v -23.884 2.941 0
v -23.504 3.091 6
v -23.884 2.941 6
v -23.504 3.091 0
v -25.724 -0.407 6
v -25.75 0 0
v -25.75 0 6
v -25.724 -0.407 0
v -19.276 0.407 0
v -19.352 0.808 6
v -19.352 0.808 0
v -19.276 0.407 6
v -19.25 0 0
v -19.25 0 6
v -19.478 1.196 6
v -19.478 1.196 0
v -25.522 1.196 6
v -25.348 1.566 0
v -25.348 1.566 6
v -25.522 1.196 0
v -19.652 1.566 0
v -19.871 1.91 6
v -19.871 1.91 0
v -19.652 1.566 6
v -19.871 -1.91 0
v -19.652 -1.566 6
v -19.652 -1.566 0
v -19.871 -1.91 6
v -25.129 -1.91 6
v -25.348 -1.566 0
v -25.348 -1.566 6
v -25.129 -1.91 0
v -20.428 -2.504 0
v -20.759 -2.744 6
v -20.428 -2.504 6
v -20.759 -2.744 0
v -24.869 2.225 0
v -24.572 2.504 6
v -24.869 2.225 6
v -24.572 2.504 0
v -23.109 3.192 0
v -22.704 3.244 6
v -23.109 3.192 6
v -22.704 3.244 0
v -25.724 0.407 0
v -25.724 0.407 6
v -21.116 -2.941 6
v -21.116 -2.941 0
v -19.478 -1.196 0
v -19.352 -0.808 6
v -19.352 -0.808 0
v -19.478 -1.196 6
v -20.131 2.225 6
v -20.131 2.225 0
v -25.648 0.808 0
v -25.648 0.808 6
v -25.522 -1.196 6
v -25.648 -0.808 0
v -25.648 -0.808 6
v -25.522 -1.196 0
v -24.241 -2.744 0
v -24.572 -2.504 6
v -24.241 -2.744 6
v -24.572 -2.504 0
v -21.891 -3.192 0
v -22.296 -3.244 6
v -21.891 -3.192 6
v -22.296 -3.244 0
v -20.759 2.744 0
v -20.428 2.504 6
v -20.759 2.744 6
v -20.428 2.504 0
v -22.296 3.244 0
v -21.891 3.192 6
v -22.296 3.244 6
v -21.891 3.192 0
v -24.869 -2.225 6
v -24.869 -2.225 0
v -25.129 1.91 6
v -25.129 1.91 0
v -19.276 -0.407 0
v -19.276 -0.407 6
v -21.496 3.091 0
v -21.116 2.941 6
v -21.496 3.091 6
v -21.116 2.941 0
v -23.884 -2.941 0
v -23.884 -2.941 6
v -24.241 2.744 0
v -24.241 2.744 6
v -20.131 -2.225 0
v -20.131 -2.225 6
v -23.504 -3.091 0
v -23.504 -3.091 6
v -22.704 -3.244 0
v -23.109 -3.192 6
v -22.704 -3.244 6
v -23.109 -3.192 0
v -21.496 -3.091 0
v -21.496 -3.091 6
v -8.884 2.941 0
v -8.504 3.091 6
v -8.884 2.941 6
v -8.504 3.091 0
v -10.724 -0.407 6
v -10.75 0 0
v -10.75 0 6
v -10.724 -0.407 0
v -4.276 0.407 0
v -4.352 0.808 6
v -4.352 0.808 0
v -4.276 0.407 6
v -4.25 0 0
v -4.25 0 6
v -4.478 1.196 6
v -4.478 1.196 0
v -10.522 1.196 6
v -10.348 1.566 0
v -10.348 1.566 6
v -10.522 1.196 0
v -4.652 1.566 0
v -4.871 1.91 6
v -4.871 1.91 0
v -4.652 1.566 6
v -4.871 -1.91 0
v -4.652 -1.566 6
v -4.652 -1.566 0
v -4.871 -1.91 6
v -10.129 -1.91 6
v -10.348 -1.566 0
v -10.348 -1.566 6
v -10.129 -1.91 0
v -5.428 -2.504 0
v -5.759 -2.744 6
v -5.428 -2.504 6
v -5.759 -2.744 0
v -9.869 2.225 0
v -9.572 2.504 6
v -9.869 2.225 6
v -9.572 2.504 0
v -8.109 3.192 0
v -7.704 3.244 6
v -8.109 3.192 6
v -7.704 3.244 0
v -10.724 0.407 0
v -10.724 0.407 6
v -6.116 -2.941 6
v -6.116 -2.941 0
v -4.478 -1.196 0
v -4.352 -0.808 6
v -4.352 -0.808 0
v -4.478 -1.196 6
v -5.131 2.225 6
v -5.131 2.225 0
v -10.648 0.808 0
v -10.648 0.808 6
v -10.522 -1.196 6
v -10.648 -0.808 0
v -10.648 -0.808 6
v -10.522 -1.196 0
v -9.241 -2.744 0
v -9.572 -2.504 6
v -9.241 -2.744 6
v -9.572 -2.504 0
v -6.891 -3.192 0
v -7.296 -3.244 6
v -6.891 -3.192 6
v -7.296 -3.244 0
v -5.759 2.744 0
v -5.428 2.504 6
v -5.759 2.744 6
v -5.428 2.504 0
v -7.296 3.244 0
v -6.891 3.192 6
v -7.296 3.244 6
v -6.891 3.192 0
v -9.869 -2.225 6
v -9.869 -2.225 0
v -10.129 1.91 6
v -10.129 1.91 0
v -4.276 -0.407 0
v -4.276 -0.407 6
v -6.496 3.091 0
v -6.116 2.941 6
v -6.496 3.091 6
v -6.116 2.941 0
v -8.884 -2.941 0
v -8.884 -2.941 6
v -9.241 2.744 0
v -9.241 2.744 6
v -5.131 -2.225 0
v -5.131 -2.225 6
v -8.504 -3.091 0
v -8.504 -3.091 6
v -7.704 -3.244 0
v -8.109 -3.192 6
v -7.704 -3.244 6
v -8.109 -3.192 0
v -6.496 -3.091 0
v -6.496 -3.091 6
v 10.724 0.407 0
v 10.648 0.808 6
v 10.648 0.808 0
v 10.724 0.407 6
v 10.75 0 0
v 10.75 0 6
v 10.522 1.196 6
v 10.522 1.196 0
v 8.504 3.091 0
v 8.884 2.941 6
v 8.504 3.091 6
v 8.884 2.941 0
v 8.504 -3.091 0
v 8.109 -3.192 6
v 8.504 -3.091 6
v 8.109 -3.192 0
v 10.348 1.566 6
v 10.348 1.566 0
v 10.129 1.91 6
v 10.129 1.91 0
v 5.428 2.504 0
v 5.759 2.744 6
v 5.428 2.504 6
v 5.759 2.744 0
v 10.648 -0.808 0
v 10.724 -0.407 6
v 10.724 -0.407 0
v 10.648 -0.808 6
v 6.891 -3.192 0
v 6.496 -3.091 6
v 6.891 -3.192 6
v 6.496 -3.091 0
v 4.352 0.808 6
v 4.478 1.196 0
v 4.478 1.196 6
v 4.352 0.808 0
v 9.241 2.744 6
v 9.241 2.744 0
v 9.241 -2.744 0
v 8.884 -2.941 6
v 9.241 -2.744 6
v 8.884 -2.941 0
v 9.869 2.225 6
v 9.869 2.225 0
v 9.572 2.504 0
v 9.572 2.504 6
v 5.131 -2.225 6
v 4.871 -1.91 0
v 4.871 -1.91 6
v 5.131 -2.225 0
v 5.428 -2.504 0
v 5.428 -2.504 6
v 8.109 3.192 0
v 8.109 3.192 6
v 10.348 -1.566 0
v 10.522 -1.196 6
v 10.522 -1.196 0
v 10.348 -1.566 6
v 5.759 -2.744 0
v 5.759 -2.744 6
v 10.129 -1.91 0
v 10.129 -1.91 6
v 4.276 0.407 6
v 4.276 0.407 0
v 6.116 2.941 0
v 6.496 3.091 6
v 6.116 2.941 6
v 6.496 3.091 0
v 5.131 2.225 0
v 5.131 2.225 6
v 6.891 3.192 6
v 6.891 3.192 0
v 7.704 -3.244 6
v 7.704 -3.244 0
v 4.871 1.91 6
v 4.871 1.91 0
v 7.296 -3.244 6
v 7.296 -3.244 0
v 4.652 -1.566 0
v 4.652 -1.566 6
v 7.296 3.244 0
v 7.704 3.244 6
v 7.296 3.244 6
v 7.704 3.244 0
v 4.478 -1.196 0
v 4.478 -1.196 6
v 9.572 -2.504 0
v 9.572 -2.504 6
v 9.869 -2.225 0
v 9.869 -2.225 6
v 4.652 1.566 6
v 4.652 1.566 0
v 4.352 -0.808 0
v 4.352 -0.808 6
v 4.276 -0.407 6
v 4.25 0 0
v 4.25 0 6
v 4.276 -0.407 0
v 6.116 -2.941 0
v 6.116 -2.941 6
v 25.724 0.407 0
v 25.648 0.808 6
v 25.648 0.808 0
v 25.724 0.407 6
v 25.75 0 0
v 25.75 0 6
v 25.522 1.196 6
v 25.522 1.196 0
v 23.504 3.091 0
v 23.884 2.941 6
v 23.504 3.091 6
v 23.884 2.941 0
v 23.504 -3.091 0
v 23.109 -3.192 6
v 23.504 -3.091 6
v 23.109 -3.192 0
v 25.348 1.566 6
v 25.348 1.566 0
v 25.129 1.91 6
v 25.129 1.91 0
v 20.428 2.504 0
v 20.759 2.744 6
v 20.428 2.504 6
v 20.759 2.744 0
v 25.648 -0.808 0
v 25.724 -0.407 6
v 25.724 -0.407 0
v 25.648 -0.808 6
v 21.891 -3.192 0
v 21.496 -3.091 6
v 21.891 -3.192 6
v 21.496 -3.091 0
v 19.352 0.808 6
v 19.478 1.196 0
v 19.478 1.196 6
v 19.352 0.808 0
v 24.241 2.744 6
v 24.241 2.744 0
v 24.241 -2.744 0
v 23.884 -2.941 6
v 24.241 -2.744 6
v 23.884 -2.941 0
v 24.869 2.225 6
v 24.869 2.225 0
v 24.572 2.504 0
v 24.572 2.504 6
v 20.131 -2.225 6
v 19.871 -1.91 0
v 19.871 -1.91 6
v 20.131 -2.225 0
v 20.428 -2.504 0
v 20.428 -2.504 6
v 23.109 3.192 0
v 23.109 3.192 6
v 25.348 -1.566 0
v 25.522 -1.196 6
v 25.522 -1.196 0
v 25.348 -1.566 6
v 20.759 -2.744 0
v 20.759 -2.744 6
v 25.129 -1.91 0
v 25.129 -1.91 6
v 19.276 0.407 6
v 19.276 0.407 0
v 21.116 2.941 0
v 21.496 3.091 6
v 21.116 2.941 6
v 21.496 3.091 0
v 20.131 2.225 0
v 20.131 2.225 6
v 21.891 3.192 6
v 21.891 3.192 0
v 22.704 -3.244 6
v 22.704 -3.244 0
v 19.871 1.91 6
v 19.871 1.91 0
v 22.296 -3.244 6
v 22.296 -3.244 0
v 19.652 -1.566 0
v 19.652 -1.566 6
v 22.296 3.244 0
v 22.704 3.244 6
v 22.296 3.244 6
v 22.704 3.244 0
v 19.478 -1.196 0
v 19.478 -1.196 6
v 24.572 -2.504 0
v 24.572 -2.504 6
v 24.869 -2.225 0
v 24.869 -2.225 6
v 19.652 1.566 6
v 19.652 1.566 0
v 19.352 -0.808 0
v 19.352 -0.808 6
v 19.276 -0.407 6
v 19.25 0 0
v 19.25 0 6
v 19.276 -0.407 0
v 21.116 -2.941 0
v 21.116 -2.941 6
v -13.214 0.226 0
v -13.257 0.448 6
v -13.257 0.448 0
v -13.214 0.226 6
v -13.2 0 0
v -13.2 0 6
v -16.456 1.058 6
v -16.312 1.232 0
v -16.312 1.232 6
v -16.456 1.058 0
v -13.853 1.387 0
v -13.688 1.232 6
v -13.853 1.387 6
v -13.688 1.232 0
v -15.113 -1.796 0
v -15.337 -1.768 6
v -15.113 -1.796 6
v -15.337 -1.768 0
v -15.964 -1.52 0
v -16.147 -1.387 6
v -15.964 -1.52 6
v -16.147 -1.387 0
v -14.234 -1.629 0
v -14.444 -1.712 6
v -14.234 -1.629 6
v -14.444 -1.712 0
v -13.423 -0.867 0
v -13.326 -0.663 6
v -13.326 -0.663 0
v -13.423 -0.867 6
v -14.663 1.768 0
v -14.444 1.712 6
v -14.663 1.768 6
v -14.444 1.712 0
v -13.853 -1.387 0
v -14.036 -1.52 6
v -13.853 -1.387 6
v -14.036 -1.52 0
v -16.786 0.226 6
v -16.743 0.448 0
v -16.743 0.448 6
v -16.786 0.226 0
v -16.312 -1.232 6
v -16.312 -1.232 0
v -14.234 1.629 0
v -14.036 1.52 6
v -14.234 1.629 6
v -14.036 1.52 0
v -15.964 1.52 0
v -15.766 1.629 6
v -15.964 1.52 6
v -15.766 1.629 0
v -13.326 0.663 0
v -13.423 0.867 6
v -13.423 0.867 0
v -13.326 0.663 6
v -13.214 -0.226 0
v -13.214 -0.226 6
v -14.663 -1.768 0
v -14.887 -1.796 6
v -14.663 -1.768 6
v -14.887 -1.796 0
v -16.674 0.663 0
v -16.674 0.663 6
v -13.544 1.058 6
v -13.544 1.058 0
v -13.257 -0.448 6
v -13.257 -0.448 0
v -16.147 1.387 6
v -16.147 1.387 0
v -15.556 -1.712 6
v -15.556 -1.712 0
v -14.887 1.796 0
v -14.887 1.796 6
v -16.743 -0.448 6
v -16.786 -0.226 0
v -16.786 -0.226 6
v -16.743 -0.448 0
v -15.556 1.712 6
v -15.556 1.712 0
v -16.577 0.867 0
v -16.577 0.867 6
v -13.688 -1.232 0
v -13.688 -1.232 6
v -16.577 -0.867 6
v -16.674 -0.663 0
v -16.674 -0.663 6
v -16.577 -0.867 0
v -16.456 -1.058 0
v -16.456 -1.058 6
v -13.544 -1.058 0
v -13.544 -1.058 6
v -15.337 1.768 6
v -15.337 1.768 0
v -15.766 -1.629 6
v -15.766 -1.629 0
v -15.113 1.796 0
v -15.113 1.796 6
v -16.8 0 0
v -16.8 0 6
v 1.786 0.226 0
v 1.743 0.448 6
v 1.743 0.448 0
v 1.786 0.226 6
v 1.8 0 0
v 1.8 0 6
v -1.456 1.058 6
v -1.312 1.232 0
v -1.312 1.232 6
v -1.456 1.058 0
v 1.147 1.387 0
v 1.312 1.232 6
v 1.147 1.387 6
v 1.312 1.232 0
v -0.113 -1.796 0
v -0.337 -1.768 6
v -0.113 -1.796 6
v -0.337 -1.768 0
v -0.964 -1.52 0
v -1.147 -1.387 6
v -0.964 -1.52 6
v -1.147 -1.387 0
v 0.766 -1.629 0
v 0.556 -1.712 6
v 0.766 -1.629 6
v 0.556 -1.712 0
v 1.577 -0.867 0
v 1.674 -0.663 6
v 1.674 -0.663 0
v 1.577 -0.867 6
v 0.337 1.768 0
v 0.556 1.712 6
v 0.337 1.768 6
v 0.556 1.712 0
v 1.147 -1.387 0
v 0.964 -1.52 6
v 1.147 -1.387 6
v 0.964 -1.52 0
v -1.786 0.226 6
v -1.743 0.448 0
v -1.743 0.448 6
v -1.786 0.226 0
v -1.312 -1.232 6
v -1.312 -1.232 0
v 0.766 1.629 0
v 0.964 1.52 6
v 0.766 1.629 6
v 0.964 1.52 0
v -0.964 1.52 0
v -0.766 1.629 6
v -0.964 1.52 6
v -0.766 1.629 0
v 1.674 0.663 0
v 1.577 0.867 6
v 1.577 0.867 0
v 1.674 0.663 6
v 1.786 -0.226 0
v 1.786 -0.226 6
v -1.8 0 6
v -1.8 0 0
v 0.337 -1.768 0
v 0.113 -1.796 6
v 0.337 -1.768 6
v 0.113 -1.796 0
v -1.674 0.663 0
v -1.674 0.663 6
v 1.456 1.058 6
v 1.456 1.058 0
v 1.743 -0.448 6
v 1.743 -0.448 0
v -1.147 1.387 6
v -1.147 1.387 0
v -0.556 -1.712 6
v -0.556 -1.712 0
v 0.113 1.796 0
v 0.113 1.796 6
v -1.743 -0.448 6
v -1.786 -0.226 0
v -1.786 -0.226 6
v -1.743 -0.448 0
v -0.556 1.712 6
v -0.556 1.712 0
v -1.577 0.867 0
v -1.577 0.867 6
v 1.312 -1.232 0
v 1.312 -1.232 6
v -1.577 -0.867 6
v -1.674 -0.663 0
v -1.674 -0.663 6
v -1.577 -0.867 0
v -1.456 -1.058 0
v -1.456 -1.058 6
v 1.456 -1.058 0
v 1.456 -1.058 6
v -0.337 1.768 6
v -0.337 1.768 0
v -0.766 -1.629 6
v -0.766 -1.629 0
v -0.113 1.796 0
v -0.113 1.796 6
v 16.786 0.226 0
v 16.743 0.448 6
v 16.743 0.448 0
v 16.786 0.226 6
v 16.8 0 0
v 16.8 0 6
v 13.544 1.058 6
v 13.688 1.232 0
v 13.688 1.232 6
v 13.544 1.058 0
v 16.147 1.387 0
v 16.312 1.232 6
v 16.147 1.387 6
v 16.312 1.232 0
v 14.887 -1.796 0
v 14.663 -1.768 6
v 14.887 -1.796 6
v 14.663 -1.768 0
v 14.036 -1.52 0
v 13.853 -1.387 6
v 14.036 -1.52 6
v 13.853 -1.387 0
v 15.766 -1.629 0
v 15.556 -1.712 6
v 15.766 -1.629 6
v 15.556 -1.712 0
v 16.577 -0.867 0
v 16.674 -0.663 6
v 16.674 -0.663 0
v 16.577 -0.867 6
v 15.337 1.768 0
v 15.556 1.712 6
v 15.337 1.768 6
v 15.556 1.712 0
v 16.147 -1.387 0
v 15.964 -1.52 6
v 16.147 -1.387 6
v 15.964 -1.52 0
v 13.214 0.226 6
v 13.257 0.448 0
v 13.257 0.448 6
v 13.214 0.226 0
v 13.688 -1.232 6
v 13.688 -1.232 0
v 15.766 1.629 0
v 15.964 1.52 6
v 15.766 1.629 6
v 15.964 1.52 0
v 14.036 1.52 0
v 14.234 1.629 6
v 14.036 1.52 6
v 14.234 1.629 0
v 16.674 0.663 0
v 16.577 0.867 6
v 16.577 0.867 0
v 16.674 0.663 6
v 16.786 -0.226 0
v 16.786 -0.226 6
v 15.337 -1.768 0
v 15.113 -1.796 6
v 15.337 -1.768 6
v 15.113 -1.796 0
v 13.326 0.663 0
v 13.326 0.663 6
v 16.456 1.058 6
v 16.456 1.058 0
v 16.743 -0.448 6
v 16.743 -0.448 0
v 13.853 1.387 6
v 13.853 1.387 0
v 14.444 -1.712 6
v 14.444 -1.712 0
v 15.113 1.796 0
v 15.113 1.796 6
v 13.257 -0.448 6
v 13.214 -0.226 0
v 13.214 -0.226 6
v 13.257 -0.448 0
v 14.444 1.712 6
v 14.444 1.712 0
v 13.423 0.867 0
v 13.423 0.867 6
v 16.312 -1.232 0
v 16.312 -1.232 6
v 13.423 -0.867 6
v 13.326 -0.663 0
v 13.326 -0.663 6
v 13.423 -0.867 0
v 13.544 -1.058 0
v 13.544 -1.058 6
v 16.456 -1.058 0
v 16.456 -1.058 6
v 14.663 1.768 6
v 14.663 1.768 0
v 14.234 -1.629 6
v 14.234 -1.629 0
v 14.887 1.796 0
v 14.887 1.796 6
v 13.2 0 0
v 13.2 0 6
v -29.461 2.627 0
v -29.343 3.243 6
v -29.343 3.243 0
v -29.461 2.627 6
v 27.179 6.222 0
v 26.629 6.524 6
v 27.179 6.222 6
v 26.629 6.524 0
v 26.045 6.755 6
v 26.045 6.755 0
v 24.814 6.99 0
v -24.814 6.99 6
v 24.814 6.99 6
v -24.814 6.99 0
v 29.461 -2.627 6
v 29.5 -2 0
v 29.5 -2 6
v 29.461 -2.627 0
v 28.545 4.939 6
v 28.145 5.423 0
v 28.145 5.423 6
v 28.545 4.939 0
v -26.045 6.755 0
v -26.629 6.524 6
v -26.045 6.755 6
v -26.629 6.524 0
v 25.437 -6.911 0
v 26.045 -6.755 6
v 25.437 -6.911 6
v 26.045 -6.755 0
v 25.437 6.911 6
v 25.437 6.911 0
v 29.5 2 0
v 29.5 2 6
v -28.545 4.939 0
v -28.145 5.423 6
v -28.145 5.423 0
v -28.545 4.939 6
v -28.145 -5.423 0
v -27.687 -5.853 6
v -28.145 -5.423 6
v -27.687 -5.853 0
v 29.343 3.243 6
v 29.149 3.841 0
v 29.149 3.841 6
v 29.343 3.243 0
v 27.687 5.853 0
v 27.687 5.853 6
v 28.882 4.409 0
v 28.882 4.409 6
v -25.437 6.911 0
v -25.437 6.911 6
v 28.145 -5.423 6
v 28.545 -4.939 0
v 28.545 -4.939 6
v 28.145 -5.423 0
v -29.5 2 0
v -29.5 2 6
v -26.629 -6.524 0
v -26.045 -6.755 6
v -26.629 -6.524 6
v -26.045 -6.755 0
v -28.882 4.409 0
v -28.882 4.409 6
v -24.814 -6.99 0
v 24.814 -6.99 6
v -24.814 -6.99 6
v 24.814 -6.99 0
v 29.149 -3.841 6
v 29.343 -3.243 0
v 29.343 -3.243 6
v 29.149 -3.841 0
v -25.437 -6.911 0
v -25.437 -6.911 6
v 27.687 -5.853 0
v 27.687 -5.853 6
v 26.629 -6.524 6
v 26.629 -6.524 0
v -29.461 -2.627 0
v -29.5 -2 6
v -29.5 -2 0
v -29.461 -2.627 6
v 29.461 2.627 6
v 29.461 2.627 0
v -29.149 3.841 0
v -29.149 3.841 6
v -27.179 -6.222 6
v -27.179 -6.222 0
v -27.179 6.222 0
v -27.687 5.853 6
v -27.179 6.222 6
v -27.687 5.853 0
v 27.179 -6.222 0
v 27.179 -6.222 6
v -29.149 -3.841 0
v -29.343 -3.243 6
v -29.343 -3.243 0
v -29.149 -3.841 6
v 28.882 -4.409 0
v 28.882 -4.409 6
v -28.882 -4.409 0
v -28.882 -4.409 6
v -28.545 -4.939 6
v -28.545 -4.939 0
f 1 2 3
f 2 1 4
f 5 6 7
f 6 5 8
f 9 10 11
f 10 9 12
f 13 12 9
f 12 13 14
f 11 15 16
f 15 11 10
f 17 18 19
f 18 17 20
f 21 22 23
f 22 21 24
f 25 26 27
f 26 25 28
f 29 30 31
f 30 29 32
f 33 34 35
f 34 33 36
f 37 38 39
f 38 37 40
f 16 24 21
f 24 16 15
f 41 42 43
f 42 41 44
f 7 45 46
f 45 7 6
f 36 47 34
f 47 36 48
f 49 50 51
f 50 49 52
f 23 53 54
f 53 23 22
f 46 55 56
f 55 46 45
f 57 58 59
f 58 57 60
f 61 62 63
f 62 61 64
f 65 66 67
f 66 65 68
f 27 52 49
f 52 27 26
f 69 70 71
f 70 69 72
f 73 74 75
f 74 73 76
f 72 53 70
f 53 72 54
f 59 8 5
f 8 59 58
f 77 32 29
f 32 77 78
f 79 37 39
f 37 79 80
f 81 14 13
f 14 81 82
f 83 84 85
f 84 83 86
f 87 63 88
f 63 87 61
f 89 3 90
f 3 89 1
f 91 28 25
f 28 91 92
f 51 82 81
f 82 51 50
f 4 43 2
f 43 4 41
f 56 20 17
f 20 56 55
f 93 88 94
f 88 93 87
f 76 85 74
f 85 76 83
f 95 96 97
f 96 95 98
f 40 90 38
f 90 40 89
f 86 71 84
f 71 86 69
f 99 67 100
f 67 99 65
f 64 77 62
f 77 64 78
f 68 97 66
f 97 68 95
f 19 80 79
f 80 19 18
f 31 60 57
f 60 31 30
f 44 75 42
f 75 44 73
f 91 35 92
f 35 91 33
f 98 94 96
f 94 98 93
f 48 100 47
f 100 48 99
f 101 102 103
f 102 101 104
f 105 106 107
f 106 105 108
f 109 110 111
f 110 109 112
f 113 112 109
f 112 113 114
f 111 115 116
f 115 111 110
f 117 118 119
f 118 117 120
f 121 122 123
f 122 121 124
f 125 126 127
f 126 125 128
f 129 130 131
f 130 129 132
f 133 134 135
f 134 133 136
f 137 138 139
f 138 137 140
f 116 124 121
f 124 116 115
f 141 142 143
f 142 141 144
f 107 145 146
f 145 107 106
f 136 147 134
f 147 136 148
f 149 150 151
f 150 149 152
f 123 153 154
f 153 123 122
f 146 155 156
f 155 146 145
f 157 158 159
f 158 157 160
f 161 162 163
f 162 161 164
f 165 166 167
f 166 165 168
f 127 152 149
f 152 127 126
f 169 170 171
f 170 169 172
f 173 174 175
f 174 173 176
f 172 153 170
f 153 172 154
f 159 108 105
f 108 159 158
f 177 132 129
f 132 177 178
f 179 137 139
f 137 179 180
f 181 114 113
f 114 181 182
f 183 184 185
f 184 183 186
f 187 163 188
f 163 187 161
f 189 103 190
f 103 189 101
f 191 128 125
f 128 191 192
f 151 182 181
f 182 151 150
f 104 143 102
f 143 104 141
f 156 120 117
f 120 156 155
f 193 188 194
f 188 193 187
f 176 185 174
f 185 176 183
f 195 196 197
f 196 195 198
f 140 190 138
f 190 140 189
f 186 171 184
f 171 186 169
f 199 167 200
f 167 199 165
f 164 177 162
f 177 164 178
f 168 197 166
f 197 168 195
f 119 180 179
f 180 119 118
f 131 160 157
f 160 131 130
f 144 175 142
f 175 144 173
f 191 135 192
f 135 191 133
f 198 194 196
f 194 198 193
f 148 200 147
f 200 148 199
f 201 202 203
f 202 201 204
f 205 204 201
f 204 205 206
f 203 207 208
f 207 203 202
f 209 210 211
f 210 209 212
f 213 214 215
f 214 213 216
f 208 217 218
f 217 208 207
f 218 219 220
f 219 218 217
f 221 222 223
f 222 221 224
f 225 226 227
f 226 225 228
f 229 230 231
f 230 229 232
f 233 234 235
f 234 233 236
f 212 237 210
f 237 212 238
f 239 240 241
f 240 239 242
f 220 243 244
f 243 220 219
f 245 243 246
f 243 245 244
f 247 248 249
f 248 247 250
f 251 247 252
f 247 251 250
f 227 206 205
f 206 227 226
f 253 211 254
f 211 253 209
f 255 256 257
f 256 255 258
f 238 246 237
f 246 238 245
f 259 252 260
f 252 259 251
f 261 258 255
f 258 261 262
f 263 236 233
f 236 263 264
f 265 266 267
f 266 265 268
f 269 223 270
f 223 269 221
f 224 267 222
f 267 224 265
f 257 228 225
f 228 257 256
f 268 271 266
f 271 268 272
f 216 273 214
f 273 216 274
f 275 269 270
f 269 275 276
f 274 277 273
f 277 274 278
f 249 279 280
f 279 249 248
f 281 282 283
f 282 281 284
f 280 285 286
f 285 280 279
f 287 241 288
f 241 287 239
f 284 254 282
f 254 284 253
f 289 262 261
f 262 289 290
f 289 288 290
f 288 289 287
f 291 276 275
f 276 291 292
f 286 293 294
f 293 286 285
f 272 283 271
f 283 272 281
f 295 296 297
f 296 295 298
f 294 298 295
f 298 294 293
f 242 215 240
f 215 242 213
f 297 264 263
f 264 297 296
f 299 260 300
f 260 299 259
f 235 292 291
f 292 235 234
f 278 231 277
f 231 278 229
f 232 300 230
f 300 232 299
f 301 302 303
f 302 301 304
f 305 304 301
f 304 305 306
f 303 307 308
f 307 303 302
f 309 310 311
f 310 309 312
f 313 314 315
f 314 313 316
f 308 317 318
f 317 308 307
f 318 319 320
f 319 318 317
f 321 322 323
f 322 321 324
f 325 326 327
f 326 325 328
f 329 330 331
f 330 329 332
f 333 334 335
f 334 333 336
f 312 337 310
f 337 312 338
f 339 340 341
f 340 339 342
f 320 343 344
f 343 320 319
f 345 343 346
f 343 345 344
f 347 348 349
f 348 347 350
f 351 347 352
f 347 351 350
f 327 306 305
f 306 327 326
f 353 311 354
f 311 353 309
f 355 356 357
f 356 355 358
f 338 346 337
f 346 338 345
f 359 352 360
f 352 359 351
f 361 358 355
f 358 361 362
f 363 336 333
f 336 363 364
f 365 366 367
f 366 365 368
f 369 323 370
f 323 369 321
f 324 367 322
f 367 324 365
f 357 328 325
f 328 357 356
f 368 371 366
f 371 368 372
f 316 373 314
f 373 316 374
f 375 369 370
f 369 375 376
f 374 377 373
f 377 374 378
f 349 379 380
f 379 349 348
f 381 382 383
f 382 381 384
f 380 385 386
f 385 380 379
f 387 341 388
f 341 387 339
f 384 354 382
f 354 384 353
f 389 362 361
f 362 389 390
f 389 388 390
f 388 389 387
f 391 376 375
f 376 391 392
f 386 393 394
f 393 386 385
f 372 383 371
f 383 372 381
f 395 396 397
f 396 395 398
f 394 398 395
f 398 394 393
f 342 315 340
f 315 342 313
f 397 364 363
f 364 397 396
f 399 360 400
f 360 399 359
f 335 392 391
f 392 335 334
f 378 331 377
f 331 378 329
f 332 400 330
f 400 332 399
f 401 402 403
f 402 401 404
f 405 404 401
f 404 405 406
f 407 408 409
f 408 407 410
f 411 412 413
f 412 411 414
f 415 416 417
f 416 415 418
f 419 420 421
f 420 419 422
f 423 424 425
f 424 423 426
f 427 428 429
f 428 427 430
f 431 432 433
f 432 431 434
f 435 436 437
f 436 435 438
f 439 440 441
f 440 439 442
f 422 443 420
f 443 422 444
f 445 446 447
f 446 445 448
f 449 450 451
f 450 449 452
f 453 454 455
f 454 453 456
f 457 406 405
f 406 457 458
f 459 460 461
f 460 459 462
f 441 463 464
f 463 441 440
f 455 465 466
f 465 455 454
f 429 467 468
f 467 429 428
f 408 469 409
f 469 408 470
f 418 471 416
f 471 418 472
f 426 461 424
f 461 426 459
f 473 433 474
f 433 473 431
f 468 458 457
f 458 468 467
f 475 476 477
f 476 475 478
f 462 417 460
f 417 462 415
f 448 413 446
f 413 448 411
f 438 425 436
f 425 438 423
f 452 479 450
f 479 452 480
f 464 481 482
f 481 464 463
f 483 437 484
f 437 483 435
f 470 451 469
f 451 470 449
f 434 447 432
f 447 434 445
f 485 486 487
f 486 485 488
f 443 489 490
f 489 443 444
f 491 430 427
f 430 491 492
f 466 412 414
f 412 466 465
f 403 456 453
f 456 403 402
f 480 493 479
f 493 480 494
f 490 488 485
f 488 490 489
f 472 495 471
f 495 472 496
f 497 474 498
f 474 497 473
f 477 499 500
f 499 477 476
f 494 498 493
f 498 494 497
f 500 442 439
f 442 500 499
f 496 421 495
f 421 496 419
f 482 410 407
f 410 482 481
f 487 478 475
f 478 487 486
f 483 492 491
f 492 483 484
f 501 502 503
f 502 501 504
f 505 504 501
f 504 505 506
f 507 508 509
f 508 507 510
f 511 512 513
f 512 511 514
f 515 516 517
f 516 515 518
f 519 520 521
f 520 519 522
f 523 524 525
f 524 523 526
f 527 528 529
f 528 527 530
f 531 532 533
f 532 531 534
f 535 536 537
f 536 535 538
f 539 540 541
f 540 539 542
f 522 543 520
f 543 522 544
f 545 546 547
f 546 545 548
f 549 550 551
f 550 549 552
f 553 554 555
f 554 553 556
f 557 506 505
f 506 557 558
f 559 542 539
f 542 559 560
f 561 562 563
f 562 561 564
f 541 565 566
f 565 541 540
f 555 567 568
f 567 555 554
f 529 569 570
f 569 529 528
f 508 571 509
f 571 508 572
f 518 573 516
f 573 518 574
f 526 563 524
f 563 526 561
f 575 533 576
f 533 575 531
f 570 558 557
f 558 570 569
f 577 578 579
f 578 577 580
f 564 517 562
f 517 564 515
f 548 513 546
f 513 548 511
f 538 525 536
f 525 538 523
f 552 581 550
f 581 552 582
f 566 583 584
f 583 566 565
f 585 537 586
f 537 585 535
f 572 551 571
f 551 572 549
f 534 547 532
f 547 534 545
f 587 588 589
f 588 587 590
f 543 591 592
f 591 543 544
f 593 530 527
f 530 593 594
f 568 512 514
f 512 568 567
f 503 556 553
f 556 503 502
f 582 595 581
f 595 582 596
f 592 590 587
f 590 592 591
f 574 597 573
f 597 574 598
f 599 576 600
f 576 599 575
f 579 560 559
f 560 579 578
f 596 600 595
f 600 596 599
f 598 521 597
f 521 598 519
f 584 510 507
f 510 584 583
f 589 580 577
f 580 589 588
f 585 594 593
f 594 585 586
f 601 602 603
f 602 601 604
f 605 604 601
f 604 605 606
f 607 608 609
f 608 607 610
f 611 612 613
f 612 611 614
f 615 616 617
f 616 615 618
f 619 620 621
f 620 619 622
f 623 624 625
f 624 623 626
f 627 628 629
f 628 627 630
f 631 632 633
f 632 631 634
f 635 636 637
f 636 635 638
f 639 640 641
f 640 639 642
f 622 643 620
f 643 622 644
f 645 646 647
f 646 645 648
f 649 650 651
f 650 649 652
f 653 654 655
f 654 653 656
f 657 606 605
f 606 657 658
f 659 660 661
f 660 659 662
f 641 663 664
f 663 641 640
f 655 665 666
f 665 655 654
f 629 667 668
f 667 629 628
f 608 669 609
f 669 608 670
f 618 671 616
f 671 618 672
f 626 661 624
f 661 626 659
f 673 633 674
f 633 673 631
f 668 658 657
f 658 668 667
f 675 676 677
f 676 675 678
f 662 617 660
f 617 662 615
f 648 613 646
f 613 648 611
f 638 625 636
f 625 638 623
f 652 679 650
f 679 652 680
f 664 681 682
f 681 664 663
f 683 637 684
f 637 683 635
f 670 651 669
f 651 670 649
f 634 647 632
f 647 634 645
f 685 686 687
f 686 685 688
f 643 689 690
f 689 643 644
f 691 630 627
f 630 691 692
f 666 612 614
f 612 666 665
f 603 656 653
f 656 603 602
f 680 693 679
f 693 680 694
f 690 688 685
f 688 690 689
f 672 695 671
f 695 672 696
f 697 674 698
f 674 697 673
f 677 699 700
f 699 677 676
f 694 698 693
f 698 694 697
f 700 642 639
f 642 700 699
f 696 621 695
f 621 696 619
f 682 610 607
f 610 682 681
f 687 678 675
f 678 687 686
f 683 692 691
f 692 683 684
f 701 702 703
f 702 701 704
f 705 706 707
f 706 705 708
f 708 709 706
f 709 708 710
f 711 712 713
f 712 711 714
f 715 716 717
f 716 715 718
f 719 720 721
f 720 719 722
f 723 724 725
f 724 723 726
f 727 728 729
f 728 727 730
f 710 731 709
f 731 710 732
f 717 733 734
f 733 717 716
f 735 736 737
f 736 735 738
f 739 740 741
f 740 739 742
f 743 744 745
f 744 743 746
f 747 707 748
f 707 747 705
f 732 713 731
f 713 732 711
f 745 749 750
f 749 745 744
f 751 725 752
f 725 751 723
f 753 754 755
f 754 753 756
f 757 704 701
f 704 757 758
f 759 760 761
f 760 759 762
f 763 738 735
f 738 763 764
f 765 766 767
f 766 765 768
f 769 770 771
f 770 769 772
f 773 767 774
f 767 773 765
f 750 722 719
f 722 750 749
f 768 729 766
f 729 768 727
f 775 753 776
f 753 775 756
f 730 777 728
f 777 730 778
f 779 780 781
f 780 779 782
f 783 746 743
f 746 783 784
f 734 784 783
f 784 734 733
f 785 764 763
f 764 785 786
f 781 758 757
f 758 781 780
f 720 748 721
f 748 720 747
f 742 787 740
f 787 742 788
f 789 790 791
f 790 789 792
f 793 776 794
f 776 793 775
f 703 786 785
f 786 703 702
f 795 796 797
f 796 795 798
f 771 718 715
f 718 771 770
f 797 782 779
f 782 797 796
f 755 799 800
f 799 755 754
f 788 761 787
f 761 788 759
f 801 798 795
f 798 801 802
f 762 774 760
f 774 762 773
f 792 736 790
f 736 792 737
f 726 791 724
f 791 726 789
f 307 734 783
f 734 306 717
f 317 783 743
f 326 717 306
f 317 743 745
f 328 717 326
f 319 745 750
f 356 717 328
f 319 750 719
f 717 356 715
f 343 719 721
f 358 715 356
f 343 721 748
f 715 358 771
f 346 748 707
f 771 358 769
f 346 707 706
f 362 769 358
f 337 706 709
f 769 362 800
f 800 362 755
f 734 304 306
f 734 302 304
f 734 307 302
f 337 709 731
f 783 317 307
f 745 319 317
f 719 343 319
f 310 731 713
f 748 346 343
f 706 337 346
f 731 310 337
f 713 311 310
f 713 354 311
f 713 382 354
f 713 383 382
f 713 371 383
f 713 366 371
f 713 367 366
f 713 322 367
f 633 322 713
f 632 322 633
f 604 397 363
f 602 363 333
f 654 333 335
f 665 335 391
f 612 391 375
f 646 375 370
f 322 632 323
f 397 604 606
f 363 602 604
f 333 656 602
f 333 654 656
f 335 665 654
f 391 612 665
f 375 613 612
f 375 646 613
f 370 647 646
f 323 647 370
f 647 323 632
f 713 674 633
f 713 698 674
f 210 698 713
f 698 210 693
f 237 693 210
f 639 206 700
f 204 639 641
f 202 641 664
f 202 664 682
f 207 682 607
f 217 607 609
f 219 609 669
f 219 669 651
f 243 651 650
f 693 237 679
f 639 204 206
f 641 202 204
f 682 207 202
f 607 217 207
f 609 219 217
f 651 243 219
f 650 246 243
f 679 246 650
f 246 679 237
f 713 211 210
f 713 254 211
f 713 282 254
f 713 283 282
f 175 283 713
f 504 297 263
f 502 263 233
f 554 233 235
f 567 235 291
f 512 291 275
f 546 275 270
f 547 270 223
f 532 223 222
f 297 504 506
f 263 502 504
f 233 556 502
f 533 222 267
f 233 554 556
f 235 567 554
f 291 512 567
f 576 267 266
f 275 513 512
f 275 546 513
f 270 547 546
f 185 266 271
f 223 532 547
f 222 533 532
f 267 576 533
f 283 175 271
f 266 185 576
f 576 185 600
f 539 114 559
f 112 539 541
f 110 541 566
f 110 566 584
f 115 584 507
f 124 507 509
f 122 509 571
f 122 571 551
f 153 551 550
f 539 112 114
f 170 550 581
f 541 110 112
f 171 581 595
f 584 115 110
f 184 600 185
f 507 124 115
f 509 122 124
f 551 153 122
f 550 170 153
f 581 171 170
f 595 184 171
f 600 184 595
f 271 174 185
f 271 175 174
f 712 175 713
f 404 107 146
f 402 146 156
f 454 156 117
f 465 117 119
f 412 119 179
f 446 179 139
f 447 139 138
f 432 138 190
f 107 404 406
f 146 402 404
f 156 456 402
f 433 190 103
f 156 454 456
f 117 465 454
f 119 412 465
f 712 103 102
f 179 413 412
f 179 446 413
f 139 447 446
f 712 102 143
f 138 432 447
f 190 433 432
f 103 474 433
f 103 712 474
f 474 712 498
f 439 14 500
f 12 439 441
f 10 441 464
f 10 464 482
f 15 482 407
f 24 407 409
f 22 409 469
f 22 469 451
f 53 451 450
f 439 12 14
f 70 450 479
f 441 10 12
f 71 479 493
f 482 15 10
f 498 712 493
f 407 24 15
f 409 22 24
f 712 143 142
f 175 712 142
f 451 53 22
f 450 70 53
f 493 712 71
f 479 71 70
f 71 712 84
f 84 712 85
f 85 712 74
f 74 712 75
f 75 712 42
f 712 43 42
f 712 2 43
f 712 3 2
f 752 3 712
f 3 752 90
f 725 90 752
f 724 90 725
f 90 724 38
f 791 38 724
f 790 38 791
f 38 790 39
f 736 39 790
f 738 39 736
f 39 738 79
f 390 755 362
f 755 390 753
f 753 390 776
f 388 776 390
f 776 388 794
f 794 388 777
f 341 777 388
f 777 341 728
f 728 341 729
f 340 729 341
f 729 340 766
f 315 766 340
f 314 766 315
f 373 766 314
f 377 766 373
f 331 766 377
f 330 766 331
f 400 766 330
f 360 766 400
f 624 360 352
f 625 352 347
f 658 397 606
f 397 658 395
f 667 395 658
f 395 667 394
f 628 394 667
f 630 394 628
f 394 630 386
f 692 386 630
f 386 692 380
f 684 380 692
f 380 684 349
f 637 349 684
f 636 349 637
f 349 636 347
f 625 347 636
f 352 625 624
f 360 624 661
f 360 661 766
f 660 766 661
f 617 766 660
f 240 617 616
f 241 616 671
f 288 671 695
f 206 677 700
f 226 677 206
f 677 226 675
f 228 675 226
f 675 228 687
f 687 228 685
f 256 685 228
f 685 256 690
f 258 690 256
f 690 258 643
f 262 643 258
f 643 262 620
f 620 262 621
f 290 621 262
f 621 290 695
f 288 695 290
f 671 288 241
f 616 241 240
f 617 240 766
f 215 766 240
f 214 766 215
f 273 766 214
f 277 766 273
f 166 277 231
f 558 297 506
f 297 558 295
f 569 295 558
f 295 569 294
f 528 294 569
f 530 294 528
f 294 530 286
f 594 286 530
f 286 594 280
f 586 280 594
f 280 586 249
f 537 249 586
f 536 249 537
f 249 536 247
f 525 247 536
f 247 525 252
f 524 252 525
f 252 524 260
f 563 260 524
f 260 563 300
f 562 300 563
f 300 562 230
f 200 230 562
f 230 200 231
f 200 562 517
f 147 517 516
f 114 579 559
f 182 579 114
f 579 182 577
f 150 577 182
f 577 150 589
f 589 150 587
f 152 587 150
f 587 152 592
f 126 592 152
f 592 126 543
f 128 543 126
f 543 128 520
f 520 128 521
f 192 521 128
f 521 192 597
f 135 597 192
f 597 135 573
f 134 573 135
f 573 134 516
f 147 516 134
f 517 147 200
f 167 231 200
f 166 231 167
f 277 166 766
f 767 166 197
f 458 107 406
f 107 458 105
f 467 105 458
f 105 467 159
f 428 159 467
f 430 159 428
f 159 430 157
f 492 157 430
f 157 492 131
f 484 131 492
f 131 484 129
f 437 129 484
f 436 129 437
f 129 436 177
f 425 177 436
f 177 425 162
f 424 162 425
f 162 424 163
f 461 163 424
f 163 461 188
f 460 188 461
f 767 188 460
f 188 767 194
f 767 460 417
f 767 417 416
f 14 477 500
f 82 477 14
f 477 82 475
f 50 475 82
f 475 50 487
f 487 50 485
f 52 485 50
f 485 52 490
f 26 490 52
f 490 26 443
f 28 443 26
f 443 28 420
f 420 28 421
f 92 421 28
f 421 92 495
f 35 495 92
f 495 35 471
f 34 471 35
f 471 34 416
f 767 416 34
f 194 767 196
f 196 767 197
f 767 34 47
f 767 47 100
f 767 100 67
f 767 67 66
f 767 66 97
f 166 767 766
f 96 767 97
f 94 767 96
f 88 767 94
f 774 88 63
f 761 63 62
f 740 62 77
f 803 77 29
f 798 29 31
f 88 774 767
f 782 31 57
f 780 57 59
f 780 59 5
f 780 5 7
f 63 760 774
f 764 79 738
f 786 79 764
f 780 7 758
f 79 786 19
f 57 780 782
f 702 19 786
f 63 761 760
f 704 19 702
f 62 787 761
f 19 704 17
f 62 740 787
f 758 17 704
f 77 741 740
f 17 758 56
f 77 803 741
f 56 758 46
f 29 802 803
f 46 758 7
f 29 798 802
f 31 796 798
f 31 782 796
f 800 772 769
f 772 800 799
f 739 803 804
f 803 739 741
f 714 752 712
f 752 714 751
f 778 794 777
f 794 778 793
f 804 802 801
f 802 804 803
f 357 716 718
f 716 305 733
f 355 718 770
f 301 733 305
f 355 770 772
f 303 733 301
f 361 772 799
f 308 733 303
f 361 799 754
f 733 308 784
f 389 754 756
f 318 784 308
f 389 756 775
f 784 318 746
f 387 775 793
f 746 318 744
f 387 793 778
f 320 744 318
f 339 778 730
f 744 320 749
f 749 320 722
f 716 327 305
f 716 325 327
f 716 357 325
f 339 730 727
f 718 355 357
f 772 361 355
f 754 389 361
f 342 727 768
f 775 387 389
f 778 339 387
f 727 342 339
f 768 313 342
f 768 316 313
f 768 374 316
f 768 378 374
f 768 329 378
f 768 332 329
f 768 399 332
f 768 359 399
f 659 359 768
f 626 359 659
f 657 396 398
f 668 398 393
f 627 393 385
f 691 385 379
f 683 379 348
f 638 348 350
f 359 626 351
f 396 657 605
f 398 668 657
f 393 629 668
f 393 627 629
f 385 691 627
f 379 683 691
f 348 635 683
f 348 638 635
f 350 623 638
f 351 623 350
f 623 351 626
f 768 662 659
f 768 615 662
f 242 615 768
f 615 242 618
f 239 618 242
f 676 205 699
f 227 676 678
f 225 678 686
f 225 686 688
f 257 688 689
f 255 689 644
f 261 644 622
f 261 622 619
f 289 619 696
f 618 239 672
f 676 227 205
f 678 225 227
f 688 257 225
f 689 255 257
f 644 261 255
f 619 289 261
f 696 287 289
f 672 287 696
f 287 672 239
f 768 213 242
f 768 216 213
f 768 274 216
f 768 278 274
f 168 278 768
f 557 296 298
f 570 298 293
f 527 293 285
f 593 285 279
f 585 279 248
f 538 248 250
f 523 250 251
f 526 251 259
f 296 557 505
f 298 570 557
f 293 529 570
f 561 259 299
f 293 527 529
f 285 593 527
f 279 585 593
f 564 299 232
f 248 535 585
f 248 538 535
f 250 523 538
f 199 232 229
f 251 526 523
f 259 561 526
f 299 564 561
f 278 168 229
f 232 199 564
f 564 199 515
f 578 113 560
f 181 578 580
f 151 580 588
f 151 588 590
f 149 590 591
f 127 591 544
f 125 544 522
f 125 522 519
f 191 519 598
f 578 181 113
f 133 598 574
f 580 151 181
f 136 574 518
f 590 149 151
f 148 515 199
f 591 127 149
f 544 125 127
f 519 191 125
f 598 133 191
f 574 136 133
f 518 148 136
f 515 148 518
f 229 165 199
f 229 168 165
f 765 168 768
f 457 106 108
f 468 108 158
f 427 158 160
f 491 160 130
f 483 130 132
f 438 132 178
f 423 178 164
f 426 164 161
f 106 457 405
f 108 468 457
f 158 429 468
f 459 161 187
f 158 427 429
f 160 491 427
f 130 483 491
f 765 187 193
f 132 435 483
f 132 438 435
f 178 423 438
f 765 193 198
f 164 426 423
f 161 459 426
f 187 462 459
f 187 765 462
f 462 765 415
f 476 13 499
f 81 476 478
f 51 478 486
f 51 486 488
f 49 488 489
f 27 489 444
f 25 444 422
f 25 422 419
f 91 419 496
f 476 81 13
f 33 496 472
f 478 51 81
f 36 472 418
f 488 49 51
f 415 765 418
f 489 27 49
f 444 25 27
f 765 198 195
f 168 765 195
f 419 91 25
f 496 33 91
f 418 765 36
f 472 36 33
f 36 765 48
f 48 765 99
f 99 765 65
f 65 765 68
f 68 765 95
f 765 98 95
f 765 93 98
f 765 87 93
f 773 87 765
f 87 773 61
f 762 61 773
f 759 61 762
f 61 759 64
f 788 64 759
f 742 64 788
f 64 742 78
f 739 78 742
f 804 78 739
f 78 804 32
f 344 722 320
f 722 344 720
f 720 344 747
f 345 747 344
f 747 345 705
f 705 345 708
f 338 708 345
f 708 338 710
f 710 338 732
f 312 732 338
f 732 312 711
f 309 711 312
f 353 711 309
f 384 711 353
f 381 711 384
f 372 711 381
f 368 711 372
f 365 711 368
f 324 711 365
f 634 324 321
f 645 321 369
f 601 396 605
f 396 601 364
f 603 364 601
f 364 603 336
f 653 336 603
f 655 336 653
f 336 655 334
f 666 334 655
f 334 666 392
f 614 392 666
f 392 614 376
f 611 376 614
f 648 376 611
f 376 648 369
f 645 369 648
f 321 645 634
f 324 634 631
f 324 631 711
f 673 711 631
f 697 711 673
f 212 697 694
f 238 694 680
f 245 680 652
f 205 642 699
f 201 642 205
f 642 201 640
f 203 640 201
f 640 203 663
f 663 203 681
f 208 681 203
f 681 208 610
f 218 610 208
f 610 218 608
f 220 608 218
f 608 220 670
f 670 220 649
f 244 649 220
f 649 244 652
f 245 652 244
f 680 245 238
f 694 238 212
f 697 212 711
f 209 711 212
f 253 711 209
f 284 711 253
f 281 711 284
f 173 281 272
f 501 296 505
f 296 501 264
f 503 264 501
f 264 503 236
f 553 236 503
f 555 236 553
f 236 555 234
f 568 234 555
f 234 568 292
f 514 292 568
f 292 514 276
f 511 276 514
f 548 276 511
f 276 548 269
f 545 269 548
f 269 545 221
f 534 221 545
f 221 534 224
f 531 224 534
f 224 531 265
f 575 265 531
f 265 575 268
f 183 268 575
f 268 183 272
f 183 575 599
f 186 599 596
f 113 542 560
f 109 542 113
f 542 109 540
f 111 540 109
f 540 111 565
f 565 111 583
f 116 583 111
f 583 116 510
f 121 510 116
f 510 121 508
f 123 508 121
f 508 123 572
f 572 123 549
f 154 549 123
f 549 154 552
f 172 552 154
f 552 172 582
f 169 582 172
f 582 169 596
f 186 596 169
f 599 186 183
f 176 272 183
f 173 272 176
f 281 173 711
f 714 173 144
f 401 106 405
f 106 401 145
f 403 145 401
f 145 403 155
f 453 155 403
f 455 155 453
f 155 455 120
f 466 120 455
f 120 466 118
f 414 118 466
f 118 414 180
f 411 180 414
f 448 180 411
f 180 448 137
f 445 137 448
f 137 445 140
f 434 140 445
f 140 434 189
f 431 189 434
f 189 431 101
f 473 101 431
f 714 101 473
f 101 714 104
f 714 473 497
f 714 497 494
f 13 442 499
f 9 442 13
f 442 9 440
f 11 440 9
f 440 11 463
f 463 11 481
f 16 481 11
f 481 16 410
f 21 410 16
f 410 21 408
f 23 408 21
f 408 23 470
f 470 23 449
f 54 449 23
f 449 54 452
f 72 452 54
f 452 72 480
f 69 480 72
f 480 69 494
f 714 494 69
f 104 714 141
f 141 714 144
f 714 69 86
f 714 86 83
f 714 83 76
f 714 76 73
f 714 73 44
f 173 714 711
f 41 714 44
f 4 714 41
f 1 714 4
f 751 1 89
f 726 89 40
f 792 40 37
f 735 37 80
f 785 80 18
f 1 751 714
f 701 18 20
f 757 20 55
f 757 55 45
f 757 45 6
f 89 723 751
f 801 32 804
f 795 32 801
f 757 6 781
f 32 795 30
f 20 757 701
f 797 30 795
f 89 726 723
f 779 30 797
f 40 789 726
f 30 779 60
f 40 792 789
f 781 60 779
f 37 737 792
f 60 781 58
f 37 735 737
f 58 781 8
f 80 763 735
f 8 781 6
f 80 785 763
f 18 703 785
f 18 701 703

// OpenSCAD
$fn = 50;


difference() {
	union() {
		*color(alpha = 1.0000000000, c = "gray") {
			translate(v = [0, 7, 0]) {
				linear_extrude(height = 1) {
					text(font = "Arial:style=Bold", halign = "center", size = 4.5000000000, text = "COMMENT plate main", valign = "center");
				}
			}
		}
		*color(alpha = 1.0000000000, c = "gray") {
			translate(v = [0, 14, 0]) {
				linear_extrude(height = 1) {
					text(font = "Arial:style=Bold", halign = "center", size = 4.5000000000, text = "COMMENT description oobb_plate_shape_p_type_6_depth_4_width_1_height_6_thickness_true_both_holes", valign = "center");
				}
			}
		}
		hull() {
			translate(v = [-24.5000000000, 2.0000000000, 0]) {
				cylinder(h = 6, r = 5);
			}
			translate(v = [24.5000000000, 2.0000000000, 0]) {
				cylinder(h = 6, r = 5);
			}
			translate(v = [-24.5000000000, -2.0000000000, 0]) {
				cylinder(h = 6, r = 5);
			}
			translate(v = [24.5000000000, -2.0000000000, 0]) {
				cylinder(h = 6, r = 5);
			}
		}
	}
	union() {
		*color(alpha = 1.0000000000, c = "gray") {
			translate(v = [0, 7, 0]) {
				linear_extrude(height = 1) {
					text(font = "Arial:style=Bold", halign = "center", size = 4.5000000000, text = "COMMENT holes main", valign = "center");
				}
			}
		}
		*color(alpha = 1.0000000000, c = "gray") {
			translate(v = [0, 14, 0]) {
				linear_extrude(height = 1) {
					text(font = "Arial:style=Bold", halign = "center", size = 4.5000000000, text = "COMMENT description oobb_holes_shape_n_type_4_width_1_height_6_thickness_true_both_holes", valign = "center");
				}
			}
		}
		translate(v = [-22.5000000000, 0.0000000000, 0]) {
			translate(v = [0, 0, -50]) {
				cylinder(h = 100, r = 3.2500000000);
			}
		}
		translate(v = [-7.5000000000, 0.0000000000, 0]) {
			translate(v = [0, 0, -50]) {
				cylinder(h = 100, r = 3.2500000000);
			}
		}
		translate(v = [7.5000000000, 0.0000000000, 0]) {
			translate(v = [0, 0, -50]) {
				cylinder(h = 100, r = 3.2500000000);
			}
		}
		translate(v = [22.5000000000, 0.0000000000, 0]) {
			translate(v = [0, 0, -50]) {
				cylinder(h = 100, r = 3.2500000000);
			}
		}
		translate(v = [-22.5000000000, 0.0000000000, 0]) {
			translate(v = [0, 0, -50]) {
				cylinder(h = 100, r = 1.8000000000);
			}
		}
		translate(v = [-15.0000000000, 0.0000000000, 0]) {
			translate(v = [0, 0, -50]) {
				cylinder(h = 100, r = 1.8000000000);
			}
		}
		translate(v = [-7.5000000000, 0.0000000000, 0]) {
			translate(v = [0, 0, -50]) {
				cylinder(h = 100, r = 1.8000000000);
			}
		}
		translate(v = [0, 0, -50]) {
			cylinder(h = 100, r = 1.8000000000);
		}
		translate(v = [7.5000000000, 0.0000000000, 0]) {
			translate(v = [0, 0, -50]) {
				cylinder(h = 100, r = 1.8000000000);
			}
		}
		translate(v = [15.0000000000, 0.0000000000, 0]) {
			translate(v = [0, 0, -50]) {
				cylinder(h = 100, r = 1.8000000000);
			}
		}
		translate(v = [22.5000000000, 0.0000000000, 0]) {
			translate(v = [0, 0, -50]) {
				cylinder(h = 100, r = 1.8000000000);
			}
		}
	}
}
